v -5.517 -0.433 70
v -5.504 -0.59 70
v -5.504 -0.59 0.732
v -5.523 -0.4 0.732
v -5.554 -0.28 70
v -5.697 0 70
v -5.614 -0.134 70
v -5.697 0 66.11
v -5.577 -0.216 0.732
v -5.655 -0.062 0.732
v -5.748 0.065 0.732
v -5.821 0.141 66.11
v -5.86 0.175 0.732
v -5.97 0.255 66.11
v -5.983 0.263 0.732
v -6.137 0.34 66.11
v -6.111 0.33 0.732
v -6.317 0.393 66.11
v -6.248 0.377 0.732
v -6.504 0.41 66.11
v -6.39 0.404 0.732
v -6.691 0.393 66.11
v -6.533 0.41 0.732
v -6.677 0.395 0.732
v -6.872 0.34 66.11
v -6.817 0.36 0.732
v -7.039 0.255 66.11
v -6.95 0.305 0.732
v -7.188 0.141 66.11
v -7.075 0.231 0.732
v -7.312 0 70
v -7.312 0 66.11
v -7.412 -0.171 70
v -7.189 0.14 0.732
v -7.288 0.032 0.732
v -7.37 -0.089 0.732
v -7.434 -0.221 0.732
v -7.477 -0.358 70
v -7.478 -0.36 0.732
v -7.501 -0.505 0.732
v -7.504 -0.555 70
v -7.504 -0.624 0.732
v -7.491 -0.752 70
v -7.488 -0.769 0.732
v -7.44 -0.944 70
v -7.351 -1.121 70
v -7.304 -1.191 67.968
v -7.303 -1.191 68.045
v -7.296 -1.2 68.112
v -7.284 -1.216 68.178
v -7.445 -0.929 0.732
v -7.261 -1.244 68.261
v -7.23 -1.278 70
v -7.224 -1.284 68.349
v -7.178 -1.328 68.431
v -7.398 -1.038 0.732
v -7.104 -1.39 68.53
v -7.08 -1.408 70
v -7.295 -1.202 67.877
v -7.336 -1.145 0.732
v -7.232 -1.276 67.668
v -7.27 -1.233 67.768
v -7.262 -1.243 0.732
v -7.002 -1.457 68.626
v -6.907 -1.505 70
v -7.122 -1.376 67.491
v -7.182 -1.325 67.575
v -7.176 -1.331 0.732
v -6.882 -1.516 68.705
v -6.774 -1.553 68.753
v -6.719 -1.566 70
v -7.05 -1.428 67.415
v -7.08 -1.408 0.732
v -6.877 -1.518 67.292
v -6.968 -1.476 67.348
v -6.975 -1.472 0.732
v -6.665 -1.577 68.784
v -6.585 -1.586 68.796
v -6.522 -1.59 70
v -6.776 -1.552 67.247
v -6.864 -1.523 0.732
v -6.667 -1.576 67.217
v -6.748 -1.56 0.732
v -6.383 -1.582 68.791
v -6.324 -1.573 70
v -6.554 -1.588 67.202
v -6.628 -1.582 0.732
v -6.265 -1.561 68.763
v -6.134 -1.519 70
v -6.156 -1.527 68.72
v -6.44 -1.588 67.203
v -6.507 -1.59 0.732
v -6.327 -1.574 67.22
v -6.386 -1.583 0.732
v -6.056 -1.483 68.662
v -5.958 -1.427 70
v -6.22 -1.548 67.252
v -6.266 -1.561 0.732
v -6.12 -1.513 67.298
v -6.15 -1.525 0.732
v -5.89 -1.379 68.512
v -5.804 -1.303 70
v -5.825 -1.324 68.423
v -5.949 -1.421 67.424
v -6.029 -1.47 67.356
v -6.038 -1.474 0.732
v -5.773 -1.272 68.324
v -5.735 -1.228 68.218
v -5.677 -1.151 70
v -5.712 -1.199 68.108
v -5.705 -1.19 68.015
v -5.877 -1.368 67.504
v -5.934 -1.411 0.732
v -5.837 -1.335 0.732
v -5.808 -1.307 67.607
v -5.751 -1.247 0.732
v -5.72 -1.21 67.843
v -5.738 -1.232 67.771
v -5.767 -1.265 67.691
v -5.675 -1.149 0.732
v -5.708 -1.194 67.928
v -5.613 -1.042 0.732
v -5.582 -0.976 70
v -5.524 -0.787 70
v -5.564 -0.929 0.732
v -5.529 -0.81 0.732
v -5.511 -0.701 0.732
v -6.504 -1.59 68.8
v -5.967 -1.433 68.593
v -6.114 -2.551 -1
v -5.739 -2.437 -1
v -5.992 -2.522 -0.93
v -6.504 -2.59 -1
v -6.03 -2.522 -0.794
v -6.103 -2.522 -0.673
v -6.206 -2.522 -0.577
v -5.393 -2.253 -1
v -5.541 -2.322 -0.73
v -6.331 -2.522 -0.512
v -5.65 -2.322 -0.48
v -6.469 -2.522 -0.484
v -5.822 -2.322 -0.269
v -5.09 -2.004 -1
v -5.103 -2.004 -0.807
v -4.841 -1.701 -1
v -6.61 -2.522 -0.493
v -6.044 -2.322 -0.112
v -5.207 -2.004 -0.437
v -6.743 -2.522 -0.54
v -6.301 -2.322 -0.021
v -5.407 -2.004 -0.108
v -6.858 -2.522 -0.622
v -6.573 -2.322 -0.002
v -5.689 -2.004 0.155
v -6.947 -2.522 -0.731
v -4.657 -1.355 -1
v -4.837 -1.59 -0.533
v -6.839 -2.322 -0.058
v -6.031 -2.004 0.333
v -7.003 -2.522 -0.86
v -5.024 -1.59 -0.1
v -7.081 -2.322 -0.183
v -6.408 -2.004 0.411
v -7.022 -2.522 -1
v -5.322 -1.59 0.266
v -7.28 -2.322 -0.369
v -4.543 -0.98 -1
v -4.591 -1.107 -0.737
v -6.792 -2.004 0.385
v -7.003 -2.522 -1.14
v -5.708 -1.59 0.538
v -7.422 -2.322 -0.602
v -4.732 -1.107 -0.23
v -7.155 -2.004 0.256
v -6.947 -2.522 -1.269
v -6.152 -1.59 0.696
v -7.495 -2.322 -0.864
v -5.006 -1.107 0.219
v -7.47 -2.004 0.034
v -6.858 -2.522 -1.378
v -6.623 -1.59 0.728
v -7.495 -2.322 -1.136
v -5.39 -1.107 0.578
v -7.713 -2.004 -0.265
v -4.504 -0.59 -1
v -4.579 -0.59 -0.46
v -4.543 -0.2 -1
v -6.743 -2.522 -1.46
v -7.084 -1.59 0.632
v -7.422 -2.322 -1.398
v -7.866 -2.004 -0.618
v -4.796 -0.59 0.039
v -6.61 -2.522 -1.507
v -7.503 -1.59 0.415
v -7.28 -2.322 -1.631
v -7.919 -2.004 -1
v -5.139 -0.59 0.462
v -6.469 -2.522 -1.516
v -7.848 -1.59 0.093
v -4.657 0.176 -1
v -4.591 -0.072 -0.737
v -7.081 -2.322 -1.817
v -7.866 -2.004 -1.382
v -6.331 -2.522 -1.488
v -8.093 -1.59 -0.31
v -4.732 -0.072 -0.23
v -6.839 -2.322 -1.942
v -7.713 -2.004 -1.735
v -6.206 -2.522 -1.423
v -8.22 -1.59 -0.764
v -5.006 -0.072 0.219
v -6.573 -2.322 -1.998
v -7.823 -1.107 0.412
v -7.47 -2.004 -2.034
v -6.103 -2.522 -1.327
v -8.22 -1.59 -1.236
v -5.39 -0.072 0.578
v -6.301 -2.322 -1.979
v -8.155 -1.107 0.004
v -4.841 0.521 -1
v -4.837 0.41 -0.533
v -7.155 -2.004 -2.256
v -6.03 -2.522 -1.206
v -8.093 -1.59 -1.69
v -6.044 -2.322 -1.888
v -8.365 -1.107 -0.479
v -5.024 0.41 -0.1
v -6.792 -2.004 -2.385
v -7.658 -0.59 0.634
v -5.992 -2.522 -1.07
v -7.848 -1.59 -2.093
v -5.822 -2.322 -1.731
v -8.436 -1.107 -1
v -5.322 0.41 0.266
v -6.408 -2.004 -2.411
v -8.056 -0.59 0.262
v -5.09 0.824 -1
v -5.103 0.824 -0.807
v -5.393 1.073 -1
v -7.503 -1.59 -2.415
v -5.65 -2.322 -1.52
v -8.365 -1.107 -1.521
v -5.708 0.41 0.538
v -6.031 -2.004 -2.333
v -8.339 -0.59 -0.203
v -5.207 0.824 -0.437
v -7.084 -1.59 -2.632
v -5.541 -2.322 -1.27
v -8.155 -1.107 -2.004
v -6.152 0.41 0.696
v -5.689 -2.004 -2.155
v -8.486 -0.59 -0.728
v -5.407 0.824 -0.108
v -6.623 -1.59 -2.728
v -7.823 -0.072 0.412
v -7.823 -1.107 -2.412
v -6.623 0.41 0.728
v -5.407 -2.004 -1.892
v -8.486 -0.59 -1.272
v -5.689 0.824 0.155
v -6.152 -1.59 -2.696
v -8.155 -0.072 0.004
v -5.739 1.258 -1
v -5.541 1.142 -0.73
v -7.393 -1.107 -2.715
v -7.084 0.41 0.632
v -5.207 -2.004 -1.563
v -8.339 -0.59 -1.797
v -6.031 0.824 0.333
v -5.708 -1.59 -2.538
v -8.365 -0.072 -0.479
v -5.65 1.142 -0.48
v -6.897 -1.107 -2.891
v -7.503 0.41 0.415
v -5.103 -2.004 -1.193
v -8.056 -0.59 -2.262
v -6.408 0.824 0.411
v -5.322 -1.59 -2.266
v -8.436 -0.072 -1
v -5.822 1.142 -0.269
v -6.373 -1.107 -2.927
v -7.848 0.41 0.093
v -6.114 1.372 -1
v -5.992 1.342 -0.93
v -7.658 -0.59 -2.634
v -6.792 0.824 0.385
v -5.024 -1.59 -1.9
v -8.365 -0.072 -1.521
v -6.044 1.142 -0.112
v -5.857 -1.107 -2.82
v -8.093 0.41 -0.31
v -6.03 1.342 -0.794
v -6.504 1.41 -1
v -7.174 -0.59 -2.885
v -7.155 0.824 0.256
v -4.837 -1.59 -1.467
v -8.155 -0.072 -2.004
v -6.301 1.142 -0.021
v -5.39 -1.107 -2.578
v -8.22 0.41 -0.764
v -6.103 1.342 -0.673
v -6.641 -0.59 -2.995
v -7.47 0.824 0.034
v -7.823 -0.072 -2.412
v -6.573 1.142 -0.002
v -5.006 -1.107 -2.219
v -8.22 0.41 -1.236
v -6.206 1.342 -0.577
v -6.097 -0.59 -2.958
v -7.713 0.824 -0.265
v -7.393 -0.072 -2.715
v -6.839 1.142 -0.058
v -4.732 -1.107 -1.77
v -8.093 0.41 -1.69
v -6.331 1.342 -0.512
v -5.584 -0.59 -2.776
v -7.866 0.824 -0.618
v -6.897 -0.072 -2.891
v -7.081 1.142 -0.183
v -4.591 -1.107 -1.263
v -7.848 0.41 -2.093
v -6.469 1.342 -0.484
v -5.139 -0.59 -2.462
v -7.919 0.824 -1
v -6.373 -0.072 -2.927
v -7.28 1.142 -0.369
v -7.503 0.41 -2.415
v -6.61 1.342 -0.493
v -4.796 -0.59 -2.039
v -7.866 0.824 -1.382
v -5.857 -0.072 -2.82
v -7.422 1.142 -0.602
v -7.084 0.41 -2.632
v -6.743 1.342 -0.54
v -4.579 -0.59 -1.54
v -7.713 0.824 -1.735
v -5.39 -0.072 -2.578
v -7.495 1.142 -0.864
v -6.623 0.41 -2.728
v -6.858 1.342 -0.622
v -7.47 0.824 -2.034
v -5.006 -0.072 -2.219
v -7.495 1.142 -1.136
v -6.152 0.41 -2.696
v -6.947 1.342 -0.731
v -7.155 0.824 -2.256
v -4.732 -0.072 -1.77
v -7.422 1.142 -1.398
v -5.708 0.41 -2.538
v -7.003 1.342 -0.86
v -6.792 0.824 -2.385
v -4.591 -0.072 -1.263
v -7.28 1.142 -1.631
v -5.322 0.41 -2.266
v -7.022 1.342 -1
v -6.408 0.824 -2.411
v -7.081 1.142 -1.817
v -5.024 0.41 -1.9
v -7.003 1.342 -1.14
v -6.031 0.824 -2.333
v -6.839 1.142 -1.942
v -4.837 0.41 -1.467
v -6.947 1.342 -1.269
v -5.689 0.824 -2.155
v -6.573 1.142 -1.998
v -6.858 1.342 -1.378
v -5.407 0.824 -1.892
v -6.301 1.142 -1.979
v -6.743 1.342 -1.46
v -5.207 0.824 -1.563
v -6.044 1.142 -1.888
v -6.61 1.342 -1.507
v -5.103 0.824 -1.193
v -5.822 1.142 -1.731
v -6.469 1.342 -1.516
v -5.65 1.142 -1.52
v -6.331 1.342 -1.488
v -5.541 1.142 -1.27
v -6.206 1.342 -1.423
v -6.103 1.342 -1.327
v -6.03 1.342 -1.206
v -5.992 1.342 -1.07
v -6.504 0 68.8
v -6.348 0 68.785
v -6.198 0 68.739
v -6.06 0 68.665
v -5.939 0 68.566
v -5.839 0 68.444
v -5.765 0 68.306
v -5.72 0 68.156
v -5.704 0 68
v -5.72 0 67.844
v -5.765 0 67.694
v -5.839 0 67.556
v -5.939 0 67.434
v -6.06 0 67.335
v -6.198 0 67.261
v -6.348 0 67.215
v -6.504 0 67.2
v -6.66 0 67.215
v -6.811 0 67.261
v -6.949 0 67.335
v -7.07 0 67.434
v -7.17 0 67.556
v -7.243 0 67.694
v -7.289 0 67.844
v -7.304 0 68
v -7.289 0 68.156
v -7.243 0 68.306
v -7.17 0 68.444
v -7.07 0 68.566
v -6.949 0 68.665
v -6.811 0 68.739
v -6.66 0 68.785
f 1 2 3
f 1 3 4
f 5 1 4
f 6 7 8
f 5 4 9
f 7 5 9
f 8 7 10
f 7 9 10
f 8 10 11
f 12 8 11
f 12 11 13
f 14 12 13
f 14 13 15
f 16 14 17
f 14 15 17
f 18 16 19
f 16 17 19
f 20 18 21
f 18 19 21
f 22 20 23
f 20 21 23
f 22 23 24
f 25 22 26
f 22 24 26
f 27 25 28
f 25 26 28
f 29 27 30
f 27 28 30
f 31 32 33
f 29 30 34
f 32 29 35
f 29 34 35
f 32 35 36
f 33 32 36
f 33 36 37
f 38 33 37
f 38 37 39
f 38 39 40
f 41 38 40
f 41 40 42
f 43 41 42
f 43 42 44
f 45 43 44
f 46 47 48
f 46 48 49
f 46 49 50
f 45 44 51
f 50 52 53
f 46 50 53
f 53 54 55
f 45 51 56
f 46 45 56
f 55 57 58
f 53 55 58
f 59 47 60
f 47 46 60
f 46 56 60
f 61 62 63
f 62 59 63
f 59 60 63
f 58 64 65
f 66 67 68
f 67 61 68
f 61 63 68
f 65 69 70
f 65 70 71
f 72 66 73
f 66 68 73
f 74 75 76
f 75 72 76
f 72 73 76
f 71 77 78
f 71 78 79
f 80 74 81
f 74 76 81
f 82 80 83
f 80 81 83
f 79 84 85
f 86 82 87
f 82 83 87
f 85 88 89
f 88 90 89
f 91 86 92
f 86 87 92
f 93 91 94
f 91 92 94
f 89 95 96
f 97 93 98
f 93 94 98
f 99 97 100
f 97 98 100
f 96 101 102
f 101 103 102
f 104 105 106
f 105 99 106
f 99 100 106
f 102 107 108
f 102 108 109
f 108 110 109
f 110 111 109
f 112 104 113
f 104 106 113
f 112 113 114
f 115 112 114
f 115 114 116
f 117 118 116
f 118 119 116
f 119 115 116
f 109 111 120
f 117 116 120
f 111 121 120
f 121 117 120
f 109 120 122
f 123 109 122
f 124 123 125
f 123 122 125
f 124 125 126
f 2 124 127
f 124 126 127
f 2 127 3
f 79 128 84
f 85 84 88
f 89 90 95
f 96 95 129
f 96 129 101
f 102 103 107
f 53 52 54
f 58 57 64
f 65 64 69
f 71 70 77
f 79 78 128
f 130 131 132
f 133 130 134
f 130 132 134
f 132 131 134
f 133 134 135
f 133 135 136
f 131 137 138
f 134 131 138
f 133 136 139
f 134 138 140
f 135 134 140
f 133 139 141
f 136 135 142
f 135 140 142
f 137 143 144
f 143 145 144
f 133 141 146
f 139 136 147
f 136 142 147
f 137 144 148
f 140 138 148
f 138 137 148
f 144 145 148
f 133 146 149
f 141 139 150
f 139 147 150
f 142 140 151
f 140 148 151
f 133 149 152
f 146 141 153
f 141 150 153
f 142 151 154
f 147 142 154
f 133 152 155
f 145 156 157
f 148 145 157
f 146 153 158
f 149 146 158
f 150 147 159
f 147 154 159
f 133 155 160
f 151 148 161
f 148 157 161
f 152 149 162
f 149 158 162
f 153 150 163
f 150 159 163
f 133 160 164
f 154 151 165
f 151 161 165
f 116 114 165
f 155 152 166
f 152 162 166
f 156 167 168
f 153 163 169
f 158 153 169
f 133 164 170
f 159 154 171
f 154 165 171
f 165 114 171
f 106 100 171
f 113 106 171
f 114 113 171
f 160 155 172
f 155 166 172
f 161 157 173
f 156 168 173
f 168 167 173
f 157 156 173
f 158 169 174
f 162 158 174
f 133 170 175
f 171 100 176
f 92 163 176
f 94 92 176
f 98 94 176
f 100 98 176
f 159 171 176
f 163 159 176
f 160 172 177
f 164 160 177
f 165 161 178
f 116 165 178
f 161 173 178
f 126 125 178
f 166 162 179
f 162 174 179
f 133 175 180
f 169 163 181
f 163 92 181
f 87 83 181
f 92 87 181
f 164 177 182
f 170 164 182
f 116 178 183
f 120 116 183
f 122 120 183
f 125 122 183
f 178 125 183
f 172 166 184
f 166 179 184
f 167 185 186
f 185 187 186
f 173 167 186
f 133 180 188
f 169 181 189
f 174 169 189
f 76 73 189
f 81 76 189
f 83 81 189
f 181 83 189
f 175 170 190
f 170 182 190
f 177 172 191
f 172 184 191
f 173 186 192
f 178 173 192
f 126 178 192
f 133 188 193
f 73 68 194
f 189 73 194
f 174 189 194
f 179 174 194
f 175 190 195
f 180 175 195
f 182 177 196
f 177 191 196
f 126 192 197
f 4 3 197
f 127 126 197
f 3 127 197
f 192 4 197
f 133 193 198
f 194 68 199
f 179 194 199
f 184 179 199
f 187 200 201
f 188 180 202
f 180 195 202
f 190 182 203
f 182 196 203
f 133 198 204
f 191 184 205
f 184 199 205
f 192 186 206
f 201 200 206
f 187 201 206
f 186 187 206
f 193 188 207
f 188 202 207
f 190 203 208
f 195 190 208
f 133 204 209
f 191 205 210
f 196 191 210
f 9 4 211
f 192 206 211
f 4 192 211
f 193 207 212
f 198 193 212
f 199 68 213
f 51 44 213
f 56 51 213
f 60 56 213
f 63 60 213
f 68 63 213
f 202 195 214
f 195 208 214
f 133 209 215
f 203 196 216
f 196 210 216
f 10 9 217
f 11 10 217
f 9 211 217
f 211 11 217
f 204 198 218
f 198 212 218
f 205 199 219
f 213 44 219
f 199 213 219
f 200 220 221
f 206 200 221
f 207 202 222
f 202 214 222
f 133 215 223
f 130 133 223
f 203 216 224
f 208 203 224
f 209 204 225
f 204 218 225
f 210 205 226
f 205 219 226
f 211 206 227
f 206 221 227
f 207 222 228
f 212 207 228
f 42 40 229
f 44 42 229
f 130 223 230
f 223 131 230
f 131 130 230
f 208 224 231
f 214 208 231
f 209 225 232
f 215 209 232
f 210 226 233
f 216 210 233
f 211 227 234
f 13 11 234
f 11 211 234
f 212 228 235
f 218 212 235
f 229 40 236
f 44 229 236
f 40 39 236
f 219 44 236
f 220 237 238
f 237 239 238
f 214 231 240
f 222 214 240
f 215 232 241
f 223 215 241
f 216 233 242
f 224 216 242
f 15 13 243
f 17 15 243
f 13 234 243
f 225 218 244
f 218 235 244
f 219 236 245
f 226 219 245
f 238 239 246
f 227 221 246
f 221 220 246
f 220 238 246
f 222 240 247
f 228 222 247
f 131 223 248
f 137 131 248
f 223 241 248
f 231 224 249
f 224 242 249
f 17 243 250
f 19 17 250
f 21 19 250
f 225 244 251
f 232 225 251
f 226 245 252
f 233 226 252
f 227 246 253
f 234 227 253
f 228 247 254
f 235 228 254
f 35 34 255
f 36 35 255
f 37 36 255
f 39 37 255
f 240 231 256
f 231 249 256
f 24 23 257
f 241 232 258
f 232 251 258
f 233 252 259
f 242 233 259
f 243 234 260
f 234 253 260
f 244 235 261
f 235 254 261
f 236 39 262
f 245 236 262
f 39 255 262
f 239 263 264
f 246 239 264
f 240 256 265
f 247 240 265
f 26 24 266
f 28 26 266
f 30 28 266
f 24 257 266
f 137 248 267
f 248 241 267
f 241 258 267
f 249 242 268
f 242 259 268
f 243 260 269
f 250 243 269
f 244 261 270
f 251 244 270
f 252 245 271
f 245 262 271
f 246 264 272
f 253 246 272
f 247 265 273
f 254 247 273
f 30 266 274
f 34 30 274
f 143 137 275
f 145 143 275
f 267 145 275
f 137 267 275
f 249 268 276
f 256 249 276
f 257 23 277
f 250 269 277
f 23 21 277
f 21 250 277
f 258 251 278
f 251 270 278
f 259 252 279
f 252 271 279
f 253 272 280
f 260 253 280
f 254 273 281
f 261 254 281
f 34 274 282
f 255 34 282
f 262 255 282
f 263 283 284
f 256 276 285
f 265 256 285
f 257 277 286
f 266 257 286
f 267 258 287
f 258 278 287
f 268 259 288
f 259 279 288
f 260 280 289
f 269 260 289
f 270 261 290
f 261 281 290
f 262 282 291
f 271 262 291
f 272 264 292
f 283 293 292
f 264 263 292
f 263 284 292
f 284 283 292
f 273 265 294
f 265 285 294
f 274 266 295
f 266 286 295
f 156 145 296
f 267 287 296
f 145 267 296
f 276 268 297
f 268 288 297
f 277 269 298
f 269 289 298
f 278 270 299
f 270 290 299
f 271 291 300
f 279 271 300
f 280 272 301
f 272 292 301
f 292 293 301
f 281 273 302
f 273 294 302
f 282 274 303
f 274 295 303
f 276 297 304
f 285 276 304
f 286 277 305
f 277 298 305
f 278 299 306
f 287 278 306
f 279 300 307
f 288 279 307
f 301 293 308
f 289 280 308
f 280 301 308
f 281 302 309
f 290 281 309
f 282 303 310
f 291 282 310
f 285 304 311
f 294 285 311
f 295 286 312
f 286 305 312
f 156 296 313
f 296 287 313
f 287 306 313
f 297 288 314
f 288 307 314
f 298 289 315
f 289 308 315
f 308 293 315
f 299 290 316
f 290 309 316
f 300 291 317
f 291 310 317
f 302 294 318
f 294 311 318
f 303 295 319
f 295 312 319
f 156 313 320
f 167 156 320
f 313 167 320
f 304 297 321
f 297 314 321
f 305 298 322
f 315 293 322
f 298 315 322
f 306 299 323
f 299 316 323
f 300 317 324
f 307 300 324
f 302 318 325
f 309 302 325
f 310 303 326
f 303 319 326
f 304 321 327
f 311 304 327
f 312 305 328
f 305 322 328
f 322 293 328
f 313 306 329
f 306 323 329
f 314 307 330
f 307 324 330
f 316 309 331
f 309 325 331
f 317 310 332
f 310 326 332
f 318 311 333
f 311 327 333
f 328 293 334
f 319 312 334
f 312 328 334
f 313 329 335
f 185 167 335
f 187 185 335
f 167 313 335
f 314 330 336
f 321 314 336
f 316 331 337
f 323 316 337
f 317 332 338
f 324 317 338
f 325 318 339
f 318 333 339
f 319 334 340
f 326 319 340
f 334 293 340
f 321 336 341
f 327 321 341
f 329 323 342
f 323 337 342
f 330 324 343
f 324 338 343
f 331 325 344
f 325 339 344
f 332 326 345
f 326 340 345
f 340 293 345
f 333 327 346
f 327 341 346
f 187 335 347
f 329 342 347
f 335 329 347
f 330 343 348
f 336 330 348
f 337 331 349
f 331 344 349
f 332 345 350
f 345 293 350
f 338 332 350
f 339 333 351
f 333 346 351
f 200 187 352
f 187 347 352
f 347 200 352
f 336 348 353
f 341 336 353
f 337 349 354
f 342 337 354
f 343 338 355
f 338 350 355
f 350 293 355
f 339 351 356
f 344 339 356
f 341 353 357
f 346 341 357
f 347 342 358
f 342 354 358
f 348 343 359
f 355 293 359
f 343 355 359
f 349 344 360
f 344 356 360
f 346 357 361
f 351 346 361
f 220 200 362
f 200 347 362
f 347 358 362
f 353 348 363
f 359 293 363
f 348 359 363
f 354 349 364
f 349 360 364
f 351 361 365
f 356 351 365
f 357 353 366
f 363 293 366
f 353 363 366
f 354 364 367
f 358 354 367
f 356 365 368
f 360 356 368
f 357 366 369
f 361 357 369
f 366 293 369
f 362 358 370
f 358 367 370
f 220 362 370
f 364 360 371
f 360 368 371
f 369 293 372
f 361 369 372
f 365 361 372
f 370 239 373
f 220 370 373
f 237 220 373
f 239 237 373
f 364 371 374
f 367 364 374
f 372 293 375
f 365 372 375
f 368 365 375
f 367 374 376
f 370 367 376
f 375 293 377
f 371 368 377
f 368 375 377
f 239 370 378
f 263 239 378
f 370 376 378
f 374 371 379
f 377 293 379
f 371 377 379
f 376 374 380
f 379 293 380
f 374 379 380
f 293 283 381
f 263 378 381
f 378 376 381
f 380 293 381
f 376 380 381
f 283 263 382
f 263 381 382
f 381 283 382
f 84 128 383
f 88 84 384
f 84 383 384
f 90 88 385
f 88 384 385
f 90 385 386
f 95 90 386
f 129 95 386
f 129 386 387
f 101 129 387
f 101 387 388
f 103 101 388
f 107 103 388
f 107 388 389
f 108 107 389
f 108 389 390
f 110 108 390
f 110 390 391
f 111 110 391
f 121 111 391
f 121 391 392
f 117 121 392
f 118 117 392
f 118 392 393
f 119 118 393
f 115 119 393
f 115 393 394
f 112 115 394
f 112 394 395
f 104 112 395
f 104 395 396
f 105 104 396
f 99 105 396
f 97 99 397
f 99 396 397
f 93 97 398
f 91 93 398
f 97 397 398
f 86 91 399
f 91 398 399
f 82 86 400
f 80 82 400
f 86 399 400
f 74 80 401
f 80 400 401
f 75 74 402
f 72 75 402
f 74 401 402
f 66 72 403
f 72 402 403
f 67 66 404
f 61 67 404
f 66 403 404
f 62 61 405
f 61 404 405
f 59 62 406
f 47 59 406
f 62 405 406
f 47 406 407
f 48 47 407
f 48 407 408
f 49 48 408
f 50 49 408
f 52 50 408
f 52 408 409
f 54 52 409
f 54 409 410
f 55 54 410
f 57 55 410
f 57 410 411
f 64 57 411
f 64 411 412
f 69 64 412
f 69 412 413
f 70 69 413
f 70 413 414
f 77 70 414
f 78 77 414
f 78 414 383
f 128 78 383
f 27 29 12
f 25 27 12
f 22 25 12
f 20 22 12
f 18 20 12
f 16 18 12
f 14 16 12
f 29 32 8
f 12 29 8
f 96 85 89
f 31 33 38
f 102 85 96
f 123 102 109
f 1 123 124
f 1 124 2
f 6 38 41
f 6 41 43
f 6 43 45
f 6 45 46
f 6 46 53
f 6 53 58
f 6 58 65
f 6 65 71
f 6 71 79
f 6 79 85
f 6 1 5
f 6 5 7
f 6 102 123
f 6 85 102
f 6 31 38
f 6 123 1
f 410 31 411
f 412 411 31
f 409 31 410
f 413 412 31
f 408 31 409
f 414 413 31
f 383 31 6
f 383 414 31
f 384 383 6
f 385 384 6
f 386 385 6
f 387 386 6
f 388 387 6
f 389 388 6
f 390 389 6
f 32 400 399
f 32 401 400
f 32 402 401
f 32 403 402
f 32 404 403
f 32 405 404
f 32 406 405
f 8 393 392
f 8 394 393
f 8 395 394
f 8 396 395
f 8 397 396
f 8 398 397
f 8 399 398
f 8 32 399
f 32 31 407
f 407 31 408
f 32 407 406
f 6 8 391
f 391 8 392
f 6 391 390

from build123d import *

# Parameters (mm, degrees)
SKETCH1_R           = 1
BOSS_EXTRUDE1_DEPTH = 70
SKETCH3_W           = 4.158474465
SKETCH3_H           = 4.275067207
CUT_EXTRUDE1_DEPTH  = 1
SKETCH4_R           = 0.8
CUT_EXTRUDE2_DEPTH  = 4


with BuildPart() as part:
    # Sketch1 → Boss-Extrude1 (new body)
    with BuildSketch(Plane.XY):
        with Locations((-6.504393421, -0.589738754)):
            Circle(SKETCH1_R)
    extrude(amount=BOSS_EXTRUDE1_DEPTH)

    # Sketch2 → Revolve1 (revolve)
    with BuildSketch(Plane(origin=(0, 0, -1), x_dir=(-1, 0, 0), z_dir=(0, 0, -1))):
        with BuildLine():
            Line((6.504393421, 1.410261246), (6.504393421, -2.589738754))
            ThreePointArc((6.504393421, -2.589738754), (4.504393421, -0.589738754), (6.504393421, 1.410261246))
        make_face()
    revolve(axis=Axis((-6.504393421, 2.047627036, -1), (0, -1, 0)))

    # Sketch3 → Cut-Extrude1 (cut)
    with BuildSketch(Plane(origin=(0, 0, 0), x_dir=(1, 0, 0), z_dir=(0, 1, 0))):
        with Locations((-6.409968211, -68.247716877)):
            Rectangle(SKETCH3_W, SKETCH3_H)
    extrude(amount=CUT_EXTRUDE1_DEPTH, mode=Mode.SUBTRACT)

    # Sketch4 → Cut-Extrude2 (cut)
    with BuildSketch(Plane(origin=(0, 0, 0), x_dir=(1, 0, 0), z_dir=(0, 1, 0))):
        with Locations(Location((-6.504393421, -68, 0), (0, 0, 270))):
            Circle(SKETCH4_R)
    extrude(amount=-CUT_EXTRUDE2_DEPTH, mode=Mode.SUBTRACT)


solid = part.part
